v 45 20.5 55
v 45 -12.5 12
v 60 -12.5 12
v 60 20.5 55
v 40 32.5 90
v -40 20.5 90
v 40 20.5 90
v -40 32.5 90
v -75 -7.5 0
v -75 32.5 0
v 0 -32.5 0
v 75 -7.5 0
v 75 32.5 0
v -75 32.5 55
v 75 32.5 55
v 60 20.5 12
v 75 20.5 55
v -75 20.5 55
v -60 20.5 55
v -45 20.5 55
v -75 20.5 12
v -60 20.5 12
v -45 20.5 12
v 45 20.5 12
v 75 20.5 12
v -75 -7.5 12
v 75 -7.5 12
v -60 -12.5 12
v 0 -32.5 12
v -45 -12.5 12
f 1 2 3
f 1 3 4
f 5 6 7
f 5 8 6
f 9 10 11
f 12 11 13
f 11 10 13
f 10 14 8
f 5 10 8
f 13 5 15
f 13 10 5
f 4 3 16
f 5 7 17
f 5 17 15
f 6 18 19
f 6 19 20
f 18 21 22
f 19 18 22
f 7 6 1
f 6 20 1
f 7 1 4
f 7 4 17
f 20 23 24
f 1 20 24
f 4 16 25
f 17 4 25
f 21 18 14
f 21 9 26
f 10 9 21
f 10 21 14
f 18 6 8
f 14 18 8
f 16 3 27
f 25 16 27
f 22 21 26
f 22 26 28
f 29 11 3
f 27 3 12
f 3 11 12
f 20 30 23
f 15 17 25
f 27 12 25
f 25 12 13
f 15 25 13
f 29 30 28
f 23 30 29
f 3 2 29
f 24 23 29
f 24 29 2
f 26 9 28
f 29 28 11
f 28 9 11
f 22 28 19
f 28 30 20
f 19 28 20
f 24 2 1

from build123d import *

# Parameters (mm, degrees)
F1_DEPTH      = 12
F2_W          = 150
F2_H          = 12
F3_DEPTH      = 90
F4_SIZE2      = 35
F4_SIZE       = 35
F5_W          = 15
F5_H          = 33
F6_DEPTH      = 55
F8_DEPTH      = 60
F8_DEPTH_BACK = 60


with BuildPart() as f1:
    # F0 (on Top) → F1 (new body)
    with BuildSketch(Plane.XY):
        Polygon((75, 20.5), (-75, 20.5), (-75, -7.5), (0, -32.5), (75, -7.5), align=None)
    extrude(amount=F1_DEPTH)

    # F2 (on Top) → F3 (join)
    with BuildSketch(Plane.XY):
        with Locations((0, 26.5)):
            Rectangle(F2_W, F2_H)
    extrude(amount=F3_DEPTH)

    # F4
    f4_edges = [f1.edges().sort_by_distance(p)[0] for p in [
        (-75, 26.5, 90),
        (75, 26.5, 90),
    ]]
    chamfer(f4_edges, length=F4_SIZE, length2=F4_SIZE2)

    # F5 (on Top) → F6 (join)
    with BuildSketch(Plane.XY):
        with Locations((-52.5, 4)):
            Rectangle(F5_W, F5_H)
        with Locations((52.5, 4)):
            Rectangle(F5_W, F5_H)
    extrude(amount=F6_DEPTH)

    # F7 (on Right) → F8 (cut, two sides)
    with BuildSketch(Plane.YZ) as f8_sk:
        Polygon((-12.5, 12), (20.5, 55), (-12.5, 55), align=None)
    extrude(amount=-F8_DEPTH, mode=Mode.SUBTRACT)
    extrude(f8_sk.sketch, amount=F8_DEPTH_BACK, mode=Mode.SUBTRACT)


solid = f1.part
